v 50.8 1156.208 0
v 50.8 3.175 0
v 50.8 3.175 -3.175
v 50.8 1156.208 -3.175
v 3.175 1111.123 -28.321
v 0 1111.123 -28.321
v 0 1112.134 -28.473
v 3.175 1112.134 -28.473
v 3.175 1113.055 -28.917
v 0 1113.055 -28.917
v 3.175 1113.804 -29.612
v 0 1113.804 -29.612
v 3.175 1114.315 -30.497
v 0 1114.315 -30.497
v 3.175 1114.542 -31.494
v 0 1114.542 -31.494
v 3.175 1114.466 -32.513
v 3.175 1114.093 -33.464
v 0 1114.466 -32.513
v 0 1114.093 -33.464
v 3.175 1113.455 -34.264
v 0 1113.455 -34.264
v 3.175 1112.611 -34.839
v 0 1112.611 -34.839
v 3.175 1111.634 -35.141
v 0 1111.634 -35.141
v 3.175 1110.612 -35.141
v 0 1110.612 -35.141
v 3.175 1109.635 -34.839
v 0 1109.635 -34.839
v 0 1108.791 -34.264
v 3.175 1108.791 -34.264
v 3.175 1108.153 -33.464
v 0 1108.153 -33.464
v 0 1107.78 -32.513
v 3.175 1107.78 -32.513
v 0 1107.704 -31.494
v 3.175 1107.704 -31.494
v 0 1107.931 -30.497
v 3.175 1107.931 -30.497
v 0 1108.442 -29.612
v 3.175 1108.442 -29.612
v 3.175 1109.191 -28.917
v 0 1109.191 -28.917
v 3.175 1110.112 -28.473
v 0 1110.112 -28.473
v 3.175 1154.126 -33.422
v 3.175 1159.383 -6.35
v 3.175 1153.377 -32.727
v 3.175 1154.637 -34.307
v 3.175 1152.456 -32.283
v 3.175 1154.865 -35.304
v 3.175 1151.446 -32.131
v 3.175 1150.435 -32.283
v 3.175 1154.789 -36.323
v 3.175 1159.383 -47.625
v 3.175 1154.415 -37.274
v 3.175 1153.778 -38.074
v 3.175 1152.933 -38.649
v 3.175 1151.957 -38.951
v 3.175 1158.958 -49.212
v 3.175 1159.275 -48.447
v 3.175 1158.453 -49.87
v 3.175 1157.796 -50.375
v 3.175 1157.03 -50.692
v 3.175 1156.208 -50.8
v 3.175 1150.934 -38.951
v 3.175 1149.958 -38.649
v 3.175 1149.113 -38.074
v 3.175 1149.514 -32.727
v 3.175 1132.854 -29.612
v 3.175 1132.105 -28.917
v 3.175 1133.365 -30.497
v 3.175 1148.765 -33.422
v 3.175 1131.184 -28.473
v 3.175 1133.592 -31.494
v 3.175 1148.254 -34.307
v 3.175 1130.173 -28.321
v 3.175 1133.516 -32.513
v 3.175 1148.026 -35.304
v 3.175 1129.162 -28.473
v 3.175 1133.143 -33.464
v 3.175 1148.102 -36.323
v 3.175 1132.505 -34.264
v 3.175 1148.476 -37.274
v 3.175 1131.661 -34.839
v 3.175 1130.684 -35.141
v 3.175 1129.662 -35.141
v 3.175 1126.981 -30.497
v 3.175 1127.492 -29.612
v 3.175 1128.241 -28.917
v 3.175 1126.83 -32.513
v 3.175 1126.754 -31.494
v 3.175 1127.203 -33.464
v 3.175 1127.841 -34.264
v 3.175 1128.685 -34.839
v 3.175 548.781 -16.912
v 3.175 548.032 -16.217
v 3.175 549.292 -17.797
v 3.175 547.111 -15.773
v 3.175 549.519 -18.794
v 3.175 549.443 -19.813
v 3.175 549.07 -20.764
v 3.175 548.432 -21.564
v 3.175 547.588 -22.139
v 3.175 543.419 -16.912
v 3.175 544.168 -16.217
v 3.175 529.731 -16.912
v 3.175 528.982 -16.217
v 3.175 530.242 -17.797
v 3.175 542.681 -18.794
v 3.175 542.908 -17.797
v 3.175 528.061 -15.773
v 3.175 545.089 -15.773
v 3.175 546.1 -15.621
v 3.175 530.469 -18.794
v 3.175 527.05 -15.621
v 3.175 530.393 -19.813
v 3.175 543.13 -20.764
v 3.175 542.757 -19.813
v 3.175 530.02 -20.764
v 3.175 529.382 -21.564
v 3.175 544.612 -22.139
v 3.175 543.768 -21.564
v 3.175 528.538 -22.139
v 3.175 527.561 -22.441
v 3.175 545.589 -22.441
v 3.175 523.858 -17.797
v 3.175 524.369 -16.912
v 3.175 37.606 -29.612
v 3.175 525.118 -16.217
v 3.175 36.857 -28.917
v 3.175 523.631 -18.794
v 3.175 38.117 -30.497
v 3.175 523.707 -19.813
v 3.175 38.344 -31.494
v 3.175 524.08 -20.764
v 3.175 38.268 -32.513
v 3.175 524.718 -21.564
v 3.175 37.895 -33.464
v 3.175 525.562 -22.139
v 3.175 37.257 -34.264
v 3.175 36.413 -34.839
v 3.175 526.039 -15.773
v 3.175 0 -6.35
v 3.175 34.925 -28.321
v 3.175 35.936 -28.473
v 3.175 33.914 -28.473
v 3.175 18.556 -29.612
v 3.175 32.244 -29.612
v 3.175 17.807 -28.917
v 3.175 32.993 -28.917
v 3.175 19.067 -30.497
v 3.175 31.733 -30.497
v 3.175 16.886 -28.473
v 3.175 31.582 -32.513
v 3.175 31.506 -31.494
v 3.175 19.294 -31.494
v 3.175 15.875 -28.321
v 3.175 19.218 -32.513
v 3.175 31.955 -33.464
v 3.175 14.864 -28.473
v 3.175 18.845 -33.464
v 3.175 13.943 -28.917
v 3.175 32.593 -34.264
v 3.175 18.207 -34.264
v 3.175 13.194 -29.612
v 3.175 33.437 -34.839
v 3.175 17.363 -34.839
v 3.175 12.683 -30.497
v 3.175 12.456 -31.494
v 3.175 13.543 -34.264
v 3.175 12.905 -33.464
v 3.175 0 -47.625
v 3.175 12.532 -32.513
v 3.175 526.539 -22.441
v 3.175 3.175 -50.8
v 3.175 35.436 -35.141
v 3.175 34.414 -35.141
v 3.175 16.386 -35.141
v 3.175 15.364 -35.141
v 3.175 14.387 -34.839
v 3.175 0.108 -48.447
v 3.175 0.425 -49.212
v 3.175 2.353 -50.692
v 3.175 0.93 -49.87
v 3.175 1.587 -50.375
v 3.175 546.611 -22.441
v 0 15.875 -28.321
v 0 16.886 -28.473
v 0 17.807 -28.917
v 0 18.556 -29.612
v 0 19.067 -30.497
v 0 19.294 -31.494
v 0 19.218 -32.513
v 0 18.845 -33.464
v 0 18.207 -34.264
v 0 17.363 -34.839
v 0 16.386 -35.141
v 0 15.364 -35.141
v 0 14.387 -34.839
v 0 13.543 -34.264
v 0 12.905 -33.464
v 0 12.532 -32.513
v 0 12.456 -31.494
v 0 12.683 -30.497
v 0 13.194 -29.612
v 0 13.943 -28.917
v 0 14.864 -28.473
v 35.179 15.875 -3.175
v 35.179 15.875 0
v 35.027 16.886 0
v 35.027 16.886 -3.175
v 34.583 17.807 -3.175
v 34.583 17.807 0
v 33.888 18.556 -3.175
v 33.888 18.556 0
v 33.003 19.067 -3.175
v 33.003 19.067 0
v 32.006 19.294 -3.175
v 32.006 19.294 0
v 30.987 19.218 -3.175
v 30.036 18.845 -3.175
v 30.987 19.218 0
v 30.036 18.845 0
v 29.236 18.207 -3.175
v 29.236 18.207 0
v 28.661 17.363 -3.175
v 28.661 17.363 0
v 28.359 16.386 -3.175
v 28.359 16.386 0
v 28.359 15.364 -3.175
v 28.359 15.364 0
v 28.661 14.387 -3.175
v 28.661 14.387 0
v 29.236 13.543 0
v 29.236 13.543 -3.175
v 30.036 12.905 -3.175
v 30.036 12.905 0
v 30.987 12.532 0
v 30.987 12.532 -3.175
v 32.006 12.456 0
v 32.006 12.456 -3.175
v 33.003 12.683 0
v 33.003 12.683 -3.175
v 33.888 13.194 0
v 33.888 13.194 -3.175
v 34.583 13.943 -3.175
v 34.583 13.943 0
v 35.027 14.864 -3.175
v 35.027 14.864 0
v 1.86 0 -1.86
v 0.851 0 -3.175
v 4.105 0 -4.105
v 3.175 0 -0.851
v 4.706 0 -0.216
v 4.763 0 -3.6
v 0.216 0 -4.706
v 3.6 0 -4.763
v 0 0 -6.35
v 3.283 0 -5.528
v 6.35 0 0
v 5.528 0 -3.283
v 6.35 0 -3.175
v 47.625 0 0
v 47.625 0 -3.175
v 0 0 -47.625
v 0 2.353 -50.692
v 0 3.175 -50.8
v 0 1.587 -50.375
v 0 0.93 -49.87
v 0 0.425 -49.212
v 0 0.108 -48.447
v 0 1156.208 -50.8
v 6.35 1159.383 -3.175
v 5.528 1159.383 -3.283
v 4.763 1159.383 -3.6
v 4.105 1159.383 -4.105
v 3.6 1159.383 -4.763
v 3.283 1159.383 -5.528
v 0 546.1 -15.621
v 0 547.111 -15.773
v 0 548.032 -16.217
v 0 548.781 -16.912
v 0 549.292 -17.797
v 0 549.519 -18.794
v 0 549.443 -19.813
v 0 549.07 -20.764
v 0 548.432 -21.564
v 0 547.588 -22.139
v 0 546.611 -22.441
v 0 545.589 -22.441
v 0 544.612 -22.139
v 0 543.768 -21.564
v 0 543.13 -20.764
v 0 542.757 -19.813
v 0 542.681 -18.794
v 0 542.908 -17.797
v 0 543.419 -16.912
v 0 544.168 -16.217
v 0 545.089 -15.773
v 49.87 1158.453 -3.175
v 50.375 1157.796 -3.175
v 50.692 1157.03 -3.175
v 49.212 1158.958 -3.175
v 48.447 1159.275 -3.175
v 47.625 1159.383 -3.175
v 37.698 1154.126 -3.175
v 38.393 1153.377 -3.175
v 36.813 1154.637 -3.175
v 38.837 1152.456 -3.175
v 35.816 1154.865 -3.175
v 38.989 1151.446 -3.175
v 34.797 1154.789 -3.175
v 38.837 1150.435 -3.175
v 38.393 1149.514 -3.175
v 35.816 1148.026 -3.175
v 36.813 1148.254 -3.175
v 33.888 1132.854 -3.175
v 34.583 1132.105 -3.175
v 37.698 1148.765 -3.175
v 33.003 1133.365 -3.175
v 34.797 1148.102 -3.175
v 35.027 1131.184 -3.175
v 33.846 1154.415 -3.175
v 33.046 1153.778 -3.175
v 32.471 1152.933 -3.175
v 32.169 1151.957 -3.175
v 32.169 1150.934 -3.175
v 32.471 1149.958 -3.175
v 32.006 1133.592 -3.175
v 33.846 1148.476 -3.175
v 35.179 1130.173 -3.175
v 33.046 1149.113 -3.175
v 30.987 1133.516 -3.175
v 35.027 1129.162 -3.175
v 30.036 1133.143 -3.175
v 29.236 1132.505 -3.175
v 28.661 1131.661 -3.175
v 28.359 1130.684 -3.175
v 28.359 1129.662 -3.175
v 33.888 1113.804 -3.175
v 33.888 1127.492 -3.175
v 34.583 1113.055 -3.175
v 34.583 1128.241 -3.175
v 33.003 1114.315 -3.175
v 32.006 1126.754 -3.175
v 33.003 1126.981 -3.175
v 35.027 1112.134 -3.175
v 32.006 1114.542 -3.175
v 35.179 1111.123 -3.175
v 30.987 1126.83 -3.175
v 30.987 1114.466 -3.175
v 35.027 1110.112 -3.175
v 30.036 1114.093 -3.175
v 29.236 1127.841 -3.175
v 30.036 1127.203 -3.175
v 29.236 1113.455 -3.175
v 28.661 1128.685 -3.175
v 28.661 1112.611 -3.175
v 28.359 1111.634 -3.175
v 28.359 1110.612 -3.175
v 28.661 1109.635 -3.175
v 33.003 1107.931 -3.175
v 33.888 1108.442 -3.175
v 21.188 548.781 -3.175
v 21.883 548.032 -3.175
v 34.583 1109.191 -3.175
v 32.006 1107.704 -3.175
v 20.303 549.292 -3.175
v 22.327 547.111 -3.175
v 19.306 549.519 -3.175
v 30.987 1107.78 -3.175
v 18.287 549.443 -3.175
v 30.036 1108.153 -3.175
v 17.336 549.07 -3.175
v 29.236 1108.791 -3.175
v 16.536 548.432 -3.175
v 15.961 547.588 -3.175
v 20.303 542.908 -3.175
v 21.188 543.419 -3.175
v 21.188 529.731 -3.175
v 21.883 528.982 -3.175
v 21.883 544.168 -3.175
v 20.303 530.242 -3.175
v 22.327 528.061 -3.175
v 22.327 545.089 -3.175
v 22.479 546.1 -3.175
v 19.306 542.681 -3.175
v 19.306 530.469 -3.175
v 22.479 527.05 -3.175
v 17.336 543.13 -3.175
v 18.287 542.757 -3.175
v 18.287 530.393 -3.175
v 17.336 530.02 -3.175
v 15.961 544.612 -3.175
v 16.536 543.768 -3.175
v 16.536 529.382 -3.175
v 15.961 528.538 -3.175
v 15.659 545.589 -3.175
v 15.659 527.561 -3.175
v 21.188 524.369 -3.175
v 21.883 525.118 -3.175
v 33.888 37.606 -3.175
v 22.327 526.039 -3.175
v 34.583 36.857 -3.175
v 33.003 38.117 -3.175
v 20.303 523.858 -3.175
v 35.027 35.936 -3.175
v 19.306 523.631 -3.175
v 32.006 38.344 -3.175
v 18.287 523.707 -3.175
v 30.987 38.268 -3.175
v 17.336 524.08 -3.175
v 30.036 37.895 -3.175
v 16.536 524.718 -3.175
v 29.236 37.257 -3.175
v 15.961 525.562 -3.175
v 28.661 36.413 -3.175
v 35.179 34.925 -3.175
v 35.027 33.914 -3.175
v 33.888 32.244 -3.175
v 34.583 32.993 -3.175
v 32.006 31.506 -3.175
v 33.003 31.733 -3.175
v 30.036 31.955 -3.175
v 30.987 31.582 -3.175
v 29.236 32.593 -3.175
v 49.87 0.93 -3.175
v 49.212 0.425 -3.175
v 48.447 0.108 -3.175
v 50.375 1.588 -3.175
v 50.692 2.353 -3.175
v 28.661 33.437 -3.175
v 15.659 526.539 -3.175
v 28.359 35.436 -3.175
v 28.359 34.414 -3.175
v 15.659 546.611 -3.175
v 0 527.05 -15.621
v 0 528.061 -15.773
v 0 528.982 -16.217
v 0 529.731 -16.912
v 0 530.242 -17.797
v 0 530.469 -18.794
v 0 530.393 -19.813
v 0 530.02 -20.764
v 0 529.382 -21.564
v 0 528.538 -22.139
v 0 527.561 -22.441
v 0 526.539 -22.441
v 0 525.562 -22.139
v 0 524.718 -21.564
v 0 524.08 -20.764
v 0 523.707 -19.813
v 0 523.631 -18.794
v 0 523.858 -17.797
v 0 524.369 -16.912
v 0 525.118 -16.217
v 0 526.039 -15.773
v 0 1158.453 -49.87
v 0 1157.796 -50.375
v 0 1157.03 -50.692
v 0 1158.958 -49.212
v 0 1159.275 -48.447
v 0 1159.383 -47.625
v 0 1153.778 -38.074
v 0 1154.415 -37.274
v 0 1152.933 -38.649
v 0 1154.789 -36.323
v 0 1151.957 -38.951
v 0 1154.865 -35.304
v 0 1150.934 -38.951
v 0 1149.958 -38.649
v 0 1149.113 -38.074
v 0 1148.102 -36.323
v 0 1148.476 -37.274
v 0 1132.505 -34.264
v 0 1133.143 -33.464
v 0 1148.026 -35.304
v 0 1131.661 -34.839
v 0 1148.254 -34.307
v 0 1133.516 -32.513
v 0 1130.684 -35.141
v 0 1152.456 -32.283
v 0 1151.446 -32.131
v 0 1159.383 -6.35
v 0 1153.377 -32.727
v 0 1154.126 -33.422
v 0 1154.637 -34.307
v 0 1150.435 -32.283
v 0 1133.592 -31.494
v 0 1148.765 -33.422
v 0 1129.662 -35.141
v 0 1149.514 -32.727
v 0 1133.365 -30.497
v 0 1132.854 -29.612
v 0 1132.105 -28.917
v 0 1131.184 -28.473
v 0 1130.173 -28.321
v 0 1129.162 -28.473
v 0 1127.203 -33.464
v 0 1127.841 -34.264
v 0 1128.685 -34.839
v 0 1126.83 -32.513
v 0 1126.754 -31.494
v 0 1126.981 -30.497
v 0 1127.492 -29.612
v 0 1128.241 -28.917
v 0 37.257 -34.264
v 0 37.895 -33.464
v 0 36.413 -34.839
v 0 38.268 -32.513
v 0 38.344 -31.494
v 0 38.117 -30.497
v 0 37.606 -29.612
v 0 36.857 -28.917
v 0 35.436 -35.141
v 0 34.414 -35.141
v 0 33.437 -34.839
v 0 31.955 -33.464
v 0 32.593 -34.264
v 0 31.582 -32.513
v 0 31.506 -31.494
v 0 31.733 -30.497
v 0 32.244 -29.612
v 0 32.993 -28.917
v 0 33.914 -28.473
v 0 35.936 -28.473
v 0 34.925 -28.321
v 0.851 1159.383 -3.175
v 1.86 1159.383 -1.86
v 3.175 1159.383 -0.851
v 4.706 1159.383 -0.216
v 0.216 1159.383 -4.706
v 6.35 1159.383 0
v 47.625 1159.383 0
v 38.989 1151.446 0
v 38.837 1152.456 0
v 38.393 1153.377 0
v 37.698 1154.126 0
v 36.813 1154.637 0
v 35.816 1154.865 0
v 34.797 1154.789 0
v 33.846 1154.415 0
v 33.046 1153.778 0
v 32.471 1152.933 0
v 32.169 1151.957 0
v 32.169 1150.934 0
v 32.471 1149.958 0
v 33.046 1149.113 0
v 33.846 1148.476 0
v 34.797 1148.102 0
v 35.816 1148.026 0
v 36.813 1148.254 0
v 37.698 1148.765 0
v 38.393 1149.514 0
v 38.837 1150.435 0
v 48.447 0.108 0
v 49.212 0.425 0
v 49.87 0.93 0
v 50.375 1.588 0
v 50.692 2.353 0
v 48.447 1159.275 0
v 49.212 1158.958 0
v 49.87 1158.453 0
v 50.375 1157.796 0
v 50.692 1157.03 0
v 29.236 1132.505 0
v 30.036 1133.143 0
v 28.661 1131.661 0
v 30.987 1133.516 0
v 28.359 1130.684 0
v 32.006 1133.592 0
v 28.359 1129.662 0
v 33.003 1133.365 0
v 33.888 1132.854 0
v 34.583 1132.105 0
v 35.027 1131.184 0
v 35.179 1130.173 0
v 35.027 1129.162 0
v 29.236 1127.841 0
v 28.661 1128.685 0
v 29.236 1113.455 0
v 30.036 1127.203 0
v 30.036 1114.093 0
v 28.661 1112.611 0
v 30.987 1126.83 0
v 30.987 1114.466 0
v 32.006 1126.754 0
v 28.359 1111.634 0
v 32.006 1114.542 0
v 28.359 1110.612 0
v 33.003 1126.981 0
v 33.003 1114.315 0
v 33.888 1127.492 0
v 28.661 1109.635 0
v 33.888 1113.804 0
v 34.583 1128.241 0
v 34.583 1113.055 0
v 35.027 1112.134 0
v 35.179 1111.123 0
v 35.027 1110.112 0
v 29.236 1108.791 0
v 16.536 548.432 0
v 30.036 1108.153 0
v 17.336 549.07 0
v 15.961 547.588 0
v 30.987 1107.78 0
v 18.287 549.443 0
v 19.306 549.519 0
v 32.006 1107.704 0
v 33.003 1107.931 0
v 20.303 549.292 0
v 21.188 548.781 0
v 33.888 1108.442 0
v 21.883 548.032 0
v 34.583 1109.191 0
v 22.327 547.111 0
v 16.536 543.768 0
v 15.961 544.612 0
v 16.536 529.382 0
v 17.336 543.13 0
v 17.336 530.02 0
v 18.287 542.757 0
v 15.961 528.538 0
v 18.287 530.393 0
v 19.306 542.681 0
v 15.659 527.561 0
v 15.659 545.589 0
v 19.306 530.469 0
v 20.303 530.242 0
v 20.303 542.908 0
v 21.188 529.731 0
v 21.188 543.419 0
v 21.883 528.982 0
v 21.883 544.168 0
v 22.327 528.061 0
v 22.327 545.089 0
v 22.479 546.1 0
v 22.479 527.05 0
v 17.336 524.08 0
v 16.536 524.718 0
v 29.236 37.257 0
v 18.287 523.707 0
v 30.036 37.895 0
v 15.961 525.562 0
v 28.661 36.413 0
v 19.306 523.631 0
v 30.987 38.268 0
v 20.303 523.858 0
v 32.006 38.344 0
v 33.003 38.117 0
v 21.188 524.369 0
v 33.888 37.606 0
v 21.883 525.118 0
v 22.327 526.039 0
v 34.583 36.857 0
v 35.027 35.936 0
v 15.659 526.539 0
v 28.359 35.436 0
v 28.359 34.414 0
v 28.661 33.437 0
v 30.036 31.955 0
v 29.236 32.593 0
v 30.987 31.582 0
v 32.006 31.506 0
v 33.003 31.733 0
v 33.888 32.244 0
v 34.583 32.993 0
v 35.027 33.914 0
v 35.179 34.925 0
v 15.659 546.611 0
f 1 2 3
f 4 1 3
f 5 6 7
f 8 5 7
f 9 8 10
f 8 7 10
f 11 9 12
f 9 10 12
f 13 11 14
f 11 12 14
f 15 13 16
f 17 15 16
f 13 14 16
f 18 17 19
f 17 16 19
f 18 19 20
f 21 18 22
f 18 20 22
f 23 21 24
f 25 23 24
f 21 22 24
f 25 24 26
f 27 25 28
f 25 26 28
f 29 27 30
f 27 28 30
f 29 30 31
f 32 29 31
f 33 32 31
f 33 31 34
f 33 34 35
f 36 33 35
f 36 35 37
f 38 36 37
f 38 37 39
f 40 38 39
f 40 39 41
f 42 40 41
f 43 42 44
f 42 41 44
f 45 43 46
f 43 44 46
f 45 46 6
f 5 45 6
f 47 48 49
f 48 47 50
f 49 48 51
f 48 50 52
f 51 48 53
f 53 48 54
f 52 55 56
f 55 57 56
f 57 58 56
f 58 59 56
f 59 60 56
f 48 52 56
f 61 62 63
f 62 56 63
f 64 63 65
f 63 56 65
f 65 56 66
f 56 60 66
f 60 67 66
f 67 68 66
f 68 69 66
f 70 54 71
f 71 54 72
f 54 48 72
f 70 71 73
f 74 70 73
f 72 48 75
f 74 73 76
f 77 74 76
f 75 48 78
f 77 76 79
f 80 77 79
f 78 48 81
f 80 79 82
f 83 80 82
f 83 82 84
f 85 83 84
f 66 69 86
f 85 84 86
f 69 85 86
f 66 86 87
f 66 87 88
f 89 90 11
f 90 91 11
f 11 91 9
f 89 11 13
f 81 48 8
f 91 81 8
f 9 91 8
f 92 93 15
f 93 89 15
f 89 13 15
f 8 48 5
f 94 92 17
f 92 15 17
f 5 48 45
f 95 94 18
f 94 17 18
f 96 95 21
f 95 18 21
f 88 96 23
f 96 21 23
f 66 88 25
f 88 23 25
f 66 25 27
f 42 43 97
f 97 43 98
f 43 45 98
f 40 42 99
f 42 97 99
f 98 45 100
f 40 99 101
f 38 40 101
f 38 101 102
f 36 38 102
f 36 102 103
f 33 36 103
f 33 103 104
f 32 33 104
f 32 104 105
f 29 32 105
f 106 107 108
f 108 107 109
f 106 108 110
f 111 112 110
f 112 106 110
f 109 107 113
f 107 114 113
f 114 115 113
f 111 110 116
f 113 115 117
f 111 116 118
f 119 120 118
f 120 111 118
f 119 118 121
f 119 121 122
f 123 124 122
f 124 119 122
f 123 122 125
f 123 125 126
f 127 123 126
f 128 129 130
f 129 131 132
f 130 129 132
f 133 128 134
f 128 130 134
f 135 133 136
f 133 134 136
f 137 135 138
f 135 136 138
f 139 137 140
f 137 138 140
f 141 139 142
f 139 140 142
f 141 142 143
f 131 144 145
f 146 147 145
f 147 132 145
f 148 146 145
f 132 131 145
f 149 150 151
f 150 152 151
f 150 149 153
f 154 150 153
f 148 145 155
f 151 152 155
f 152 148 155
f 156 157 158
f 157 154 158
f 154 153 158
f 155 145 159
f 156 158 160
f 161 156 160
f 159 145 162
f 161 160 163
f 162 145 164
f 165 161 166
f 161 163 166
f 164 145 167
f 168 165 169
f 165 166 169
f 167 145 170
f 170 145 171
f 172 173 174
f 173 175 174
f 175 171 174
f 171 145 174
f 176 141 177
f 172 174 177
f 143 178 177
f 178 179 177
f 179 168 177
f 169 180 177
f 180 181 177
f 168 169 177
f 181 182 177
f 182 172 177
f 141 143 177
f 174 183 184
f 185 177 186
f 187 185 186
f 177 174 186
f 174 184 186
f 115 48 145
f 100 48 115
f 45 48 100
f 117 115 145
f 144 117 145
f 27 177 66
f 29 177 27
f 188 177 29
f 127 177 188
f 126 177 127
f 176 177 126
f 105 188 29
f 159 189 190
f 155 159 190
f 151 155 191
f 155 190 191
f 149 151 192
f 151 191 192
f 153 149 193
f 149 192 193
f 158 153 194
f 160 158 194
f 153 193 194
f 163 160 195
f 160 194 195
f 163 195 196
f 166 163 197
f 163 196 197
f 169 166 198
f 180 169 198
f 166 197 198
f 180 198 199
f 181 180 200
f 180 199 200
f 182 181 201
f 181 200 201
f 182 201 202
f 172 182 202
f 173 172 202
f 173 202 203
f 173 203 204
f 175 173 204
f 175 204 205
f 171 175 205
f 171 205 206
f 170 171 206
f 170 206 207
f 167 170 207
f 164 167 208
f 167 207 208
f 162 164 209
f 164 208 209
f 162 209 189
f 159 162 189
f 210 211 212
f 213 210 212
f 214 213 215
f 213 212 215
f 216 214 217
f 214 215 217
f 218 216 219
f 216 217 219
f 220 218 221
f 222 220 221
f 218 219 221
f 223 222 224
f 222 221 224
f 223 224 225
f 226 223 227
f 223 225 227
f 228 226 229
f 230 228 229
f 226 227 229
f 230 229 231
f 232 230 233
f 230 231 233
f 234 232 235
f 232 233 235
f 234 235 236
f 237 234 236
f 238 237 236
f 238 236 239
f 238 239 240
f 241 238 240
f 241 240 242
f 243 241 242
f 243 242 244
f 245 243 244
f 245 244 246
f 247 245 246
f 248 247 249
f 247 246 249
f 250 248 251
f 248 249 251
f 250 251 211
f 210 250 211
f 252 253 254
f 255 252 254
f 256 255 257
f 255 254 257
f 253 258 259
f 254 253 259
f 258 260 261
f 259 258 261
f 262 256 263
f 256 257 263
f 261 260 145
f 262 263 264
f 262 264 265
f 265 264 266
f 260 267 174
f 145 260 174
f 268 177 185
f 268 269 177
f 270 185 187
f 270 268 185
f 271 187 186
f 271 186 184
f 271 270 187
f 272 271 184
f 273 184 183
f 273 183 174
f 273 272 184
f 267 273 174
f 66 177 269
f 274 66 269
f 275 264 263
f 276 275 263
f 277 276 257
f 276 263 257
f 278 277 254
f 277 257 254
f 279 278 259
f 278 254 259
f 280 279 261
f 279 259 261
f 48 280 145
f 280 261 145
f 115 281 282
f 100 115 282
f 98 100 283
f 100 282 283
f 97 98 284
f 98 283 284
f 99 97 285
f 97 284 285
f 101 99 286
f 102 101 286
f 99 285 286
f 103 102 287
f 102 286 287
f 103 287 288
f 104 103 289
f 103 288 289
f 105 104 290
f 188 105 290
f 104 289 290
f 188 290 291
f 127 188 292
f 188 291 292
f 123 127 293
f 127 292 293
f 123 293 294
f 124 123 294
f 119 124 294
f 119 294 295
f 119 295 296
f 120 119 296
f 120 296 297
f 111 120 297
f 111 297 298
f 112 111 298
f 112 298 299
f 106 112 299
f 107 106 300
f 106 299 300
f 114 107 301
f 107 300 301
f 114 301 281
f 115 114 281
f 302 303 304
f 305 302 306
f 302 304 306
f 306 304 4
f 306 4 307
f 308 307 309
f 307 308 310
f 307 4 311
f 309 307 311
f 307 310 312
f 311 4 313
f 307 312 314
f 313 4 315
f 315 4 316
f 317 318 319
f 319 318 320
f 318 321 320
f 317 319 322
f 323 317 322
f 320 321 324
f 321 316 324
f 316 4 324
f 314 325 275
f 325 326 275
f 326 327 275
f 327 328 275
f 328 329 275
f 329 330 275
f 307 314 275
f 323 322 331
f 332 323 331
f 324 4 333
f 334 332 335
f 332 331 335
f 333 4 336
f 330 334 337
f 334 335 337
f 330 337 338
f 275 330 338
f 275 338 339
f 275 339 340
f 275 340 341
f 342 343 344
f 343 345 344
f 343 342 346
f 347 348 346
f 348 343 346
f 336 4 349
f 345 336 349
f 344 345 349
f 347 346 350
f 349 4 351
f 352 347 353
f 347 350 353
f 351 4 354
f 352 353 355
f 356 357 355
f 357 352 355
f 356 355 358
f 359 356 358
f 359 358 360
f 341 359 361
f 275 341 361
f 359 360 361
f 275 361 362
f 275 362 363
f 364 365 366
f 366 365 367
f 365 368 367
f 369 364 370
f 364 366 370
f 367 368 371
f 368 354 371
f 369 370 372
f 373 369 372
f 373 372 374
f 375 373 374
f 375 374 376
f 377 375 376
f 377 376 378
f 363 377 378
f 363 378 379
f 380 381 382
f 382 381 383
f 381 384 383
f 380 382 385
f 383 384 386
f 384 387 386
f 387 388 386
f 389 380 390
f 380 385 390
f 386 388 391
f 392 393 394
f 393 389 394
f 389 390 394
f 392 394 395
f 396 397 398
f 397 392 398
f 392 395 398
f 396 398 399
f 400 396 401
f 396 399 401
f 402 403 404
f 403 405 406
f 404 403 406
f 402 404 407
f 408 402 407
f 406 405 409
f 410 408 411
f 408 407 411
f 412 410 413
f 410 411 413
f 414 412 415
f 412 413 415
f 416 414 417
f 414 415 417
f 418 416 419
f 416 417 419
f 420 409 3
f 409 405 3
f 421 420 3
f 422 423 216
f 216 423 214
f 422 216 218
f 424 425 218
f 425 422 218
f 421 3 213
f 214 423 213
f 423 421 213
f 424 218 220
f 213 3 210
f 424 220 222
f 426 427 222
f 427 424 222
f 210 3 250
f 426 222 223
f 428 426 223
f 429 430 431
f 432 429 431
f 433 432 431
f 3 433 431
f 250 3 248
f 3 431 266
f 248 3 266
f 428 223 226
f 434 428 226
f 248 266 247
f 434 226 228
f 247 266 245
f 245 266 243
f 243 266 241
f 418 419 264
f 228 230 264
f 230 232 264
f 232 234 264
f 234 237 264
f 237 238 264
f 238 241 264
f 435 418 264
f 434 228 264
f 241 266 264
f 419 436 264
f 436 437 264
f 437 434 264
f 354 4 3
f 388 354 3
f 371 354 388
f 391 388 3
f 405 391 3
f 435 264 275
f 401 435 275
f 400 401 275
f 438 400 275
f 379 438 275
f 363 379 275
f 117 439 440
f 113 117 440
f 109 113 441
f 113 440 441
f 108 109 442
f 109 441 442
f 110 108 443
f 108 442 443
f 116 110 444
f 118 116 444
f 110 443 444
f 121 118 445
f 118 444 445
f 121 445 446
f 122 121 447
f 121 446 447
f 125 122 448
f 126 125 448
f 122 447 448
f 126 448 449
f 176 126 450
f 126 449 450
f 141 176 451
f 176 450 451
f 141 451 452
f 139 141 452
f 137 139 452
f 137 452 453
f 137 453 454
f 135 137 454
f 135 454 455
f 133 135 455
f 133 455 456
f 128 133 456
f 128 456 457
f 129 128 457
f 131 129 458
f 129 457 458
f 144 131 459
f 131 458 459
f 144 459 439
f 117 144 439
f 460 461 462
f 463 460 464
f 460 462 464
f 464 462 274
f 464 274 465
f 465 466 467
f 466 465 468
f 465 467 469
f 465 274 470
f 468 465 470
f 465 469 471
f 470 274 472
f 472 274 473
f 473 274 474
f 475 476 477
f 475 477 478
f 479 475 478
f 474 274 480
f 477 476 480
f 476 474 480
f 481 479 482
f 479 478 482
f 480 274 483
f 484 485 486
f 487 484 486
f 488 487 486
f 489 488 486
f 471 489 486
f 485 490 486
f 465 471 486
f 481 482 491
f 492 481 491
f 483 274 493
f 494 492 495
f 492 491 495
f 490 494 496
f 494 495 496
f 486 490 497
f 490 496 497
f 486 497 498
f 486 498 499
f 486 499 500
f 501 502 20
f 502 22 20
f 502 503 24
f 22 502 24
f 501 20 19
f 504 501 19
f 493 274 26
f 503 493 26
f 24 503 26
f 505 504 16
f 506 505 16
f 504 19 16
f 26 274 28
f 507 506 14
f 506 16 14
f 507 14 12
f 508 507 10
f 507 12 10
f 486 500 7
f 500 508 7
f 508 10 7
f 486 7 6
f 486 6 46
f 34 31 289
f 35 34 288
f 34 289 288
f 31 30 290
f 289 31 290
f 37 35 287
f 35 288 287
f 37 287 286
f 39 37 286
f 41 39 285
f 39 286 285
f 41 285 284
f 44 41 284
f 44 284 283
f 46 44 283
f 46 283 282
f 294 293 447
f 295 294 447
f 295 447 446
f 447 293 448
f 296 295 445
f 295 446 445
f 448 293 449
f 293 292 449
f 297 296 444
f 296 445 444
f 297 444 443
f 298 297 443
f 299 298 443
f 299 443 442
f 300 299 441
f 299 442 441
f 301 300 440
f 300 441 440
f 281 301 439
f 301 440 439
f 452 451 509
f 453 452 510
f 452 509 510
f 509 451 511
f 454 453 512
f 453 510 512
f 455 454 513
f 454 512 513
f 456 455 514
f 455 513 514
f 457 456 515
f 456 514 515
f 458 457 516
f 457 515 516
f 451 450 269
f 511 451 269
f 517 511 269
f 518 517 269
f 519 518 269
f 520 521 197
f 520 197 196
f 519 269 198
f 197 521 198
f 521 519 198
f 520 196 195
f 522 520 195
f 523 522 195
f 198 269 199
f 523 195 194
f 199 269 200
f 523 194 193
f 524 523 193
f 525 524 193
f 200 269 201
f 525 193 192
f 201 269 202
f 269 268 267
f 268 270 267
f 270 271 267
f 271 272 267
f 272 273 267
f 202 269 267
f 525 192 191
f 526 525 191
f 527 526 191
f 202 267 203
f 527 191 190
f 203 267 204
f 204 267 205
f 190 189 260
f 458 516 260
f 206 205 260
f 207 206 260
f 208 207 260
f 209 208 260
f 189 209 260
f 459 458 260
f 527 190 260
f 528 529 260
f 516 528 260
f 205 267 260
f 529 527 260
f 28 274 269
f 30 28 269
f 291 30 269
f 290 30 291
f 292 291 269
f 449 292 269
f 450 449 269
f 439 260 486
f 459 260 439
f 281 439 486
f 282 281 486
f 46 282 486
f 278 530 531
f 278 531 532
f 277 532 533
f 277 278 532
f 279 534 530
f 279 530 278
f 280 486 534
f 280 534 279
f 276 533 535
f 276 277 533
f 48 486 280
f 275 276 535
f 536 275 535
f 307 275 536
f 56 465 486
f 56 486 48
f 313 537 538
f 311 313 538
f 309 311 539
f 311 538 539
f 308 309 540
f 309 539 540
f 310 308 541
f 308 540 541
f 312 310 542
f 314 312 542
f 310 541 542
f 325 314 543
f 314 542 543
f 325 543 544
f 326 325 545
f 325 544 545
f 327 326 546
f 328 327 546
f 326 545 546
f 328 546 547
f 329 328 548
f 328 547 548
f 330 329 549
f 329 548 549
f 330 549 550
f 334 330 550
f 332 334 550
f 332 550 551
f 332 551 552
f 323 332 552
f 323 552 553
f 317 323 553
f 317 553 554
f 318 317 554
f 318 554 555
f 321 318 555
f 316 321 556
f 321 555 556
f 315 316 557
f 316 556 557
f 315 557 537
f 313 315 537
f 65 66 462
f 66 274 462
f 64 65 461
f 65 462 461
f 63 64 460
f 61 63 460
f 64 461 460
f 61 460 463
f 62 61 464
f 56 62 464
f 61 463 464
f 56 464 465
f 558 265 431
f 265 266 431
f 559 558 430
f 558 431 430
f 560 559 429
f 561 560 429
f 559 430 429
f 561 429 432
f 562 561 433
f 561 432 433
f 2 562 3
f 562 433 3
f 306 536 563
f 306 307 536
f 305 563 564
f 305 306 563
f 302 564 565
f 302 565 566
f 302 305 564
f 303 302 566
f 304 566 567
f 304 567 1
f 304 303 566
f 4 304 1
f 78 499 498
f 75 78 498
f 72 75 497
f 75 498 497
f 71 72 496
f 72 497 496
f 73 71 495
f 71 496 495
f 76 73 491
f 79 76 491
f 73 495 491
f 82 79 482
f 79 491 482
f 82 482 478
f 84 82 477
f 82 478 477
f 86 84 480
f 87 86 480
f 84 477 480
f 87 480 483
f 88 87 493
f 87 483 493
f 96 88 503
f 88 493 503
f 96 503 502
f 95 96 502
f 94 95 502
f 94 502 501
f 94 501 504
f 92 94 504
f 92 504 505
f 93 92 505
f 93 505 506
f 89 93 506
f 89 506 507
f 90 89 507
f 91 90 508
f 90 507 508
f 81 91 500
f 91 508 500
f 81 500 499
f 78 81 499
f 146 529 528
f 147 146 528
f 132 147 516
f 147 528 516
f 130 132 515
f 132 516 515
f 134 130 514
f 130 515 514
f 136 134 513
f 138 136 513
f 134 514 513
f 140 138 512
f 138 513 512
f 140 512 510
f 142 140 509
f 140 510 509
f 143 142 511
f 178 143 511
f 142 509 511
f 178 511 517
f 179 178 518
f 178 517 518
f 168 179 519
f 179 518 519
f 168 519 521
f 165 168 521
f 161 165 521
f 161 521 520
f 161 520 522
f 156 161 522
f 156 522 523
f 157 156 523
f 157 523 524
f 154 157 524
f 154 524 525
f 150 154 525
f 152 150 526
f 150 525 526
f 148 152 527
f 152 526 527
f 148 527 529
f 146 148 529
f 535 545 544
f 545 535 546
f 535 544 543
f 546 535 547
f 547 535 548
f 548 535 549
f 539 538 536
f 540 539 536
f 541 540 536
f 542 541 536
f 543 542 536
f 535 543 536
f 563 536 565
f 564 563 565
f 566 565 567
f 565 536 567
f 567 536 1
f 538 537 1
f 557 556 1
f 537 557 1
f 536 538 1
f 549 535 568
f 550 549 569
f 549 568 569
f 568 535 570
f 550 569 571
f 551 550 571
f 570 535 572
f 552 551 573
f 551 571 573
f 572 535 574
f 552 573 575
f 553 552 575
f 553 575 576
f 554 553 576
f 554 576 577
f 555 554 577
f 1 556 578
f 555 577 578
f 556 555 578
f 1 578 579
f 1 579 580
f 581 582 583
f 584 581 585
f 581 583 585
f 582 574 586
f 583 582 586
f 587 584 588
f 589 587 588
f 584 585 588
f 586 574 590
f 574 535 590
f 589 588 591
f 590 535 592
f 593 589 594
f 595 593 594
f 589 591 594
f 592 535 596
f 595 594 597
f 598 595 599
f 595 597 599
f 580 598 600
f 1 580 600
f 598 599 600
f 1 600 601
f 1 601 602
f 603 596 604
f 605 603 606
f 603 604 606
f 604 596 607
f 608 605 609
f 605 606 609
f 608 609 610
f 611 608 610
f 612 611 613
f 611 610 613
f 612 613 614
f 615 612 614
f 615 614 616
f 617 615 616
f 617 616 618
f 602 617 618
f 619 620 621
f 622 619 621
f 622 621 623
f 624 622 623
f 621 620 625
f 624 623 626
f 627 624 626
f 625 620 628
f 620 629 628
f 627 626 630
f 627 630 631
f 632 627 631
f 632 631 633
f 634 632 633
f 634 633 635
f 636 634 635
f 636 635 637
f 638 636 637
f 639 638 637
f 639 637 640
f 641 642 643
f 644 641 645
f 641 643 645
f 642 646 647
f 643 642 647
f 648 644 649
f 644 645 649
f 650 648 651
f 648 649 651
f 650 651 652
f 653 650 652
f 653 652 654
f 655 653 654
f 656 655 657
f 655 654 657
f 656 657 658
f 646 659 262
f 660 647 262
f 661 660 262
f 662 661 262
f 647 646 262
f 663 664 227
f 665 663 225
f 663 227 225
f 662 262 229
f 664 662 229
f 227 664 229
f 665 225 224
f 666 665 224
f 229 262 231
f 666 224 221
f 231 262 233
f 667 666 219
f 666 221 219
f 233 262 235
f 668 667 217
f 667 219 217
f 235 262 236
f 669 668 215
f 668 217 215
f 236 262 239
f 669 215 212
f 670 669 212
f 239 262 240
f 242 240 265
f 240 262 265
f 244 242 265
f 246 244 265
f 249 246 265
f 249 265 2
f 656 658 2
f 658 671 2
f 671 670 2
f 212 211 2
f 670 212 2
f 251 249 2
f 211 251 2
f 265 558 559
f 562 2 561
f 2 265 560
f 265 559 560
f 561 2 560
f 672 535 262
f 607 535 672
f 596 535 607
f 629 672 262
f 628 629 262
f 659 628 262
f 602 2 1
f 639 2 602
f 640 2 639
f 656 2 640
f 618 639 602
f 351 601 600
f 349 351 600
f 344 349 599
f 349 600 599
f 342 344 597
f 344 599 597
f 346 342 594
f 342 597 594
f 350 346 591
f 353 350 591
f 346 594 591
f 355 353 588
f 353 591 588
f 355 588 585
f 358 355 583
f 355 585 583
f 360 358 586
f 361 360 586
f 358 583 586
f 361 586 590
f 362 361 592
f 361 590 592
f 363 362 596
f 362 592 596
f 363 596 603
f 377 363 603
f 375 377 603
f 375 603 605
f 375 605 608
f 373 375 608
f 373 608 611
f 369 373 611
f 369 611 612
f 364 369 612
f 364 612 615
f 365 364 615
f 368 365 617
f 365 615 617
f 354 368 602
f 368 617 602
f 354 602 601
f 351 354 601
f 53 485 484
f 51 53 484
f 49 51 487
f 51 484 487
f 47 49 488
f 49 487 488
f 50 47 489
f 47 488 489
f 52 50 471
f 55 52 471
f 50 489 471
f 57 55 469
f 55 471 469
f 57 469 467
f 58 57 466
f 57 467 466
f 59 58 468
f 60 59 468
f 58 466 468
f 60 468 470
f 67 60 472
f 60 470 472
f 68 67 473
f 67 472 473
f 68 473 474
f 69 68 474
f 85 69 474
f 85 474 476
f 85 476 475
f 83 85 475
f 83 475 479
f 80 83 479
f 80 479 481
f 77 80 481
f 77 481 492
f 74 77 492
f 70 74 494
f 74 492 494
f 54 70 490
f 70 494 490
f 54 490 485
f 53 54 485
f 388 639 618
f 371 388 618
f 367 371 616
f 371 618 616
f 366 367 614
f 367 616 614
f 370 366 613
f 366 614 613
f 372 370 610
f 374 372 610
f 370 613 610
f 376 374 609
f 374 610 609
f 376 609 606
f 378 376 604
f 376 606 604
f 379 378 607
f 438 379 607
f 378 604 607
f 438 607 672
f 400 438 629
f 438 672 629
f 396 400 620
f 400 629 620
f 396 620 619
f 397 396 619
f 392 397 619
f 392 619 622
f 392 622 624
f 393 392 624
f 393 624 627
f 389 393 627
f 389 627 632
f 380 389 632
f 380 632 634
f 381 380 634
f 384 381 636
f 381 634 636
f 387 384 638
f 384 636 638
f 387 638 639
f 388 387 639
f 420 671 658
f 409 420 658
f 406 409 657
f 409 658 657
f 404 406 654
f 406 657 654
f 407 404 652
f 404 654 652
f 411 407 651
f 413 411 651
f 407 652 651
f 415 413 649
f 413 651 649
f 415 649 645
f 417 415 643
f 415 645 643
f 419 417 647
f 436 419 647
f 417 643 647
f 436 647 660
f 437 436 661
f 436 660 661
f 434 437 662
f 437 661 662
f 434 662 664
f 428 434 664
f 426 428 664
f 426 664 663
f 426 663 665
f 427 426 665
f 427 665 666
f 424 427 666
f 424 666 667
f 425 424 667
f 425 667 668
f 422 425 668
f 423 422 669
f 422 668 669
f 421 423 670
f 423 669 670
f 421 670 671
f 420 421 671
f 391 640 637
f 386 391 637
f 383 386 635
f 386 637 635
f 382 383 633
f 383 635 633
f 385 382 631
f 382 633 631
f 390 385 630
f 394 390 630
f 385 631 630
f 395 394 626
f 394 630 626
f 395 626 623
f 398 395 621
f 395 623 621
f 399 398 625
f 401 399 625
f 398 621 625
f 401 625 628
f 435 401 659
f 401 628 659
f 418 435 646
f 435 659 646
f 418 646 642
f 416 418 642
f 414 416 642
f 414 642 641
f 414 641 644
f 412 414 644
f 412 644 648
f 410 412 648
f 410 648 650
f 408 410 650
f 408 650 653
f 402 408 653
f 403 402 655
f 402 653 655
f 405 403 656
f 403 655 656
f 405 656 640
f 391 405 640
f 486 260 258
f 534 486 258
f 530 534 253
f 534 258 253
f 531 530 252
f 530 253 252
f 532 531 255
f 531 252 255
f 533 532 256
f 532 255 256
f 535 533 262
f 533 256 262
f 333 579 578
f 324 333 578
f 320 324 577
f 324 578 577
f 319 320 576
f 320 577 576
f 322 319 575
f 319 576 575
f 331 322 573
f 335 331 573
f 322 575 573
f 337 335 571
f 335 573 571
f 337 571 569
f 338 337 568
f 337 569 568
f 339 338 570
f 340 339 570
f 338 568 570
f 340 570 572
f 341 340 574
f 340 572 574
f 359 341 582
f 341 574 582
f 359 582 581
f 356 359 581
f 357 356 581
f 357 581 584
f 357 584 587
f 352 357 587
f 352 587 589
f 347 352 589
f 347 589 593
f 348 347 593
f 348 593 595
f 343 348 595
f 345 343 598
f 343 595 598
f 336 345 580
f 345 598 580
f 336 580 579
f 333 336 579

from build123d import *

# Parameters (mm, degrees)
BASE_FLANGE1_DEPTH = 1159.383
SKETCH2_R          = 3.429
CUT_EXTRUDE1_DEPTH = 3.175
SKETCH3_R          = 3.429
CUT_EXTRUDE2_DEPTH = 3.175
FILLET1_R          = 3.175


# Sheet-metal steps are written as plain solids
with BuildPart() as part:
    # Sketch1 → Base-Flange1 (new body)
    with BuildSketch(Plane(origin=(0, 0, 0), x_dir=(1, 0, 0), z_dir=(0, 1, 0))):
        with BuildLine():
            Line((0, 50.8), (0, 6.35))
            ThreePointArc((0, 6.35), (1.859871939, 1.859871939), (6.35, 0))
            Line((6.35, 0), (50.8, 0))
            Line((50.8, 0), (50.8, 3.175))
            Line((50.8, 3.175), (6.35, 3.175))
            ThreePointArc((6.35, 3.175), (4.10493597, 4.10493597), (3.175, 6.35))
            Line((3.175, 6.35), (3.175, 50.8))
            Line((3.175, 50.8), (0, 50.8))
        make_face()
    extrude(amount=BASE_FLANGE1_DEPTH)

    # Sketch2 → Cut-Extrude1 (cut)
    with BuildSketch(Plane.XY):
        with Locations((31.75, 34.925)):
            Circle(SKETCH2_R)
        with Locations((31.75, 15.875)):
            Circle(SKETCH2_R)
        with Locations((19.05, 546.1)):
            Circle(SKETCH2_R)
        with Locations((19.05, 527.05)):
            Circle(SKETCH2_R)
        with Locations((31.75, 1130.173)):
            Circle(SKETCH2_R)
        with Locations((31.75, 1111.123)):
            Circle(SKETCH2_R)
        with Locations((35.56, 1151.4455)):
            Circle(SKETCH2_R)
    extrude(amount=-CUT_EXTRUDE1_DEPTH, mode=Mode.SUBTRACT)

    # Sketch3 → Cut-Extrude2 (cut)
    with BuildSketch(Plane.ZY):
        with Locations((-35.56, 1151.4455)):
            Circle(SKETCH3_R)
        with Locations((-31.75, 34.925)):
            Circle(SKETCH3_R)
        with Locations((-31.75, 15.875)):
            Circle(SKETCH3_R)
        with Locations((-19.05, 546.1)):
            Circle(SKETCH3_R)
        with Locations((-19.05, 527.05)):
            Circle(SKETCH3_R)
        with Locations((-31.75, 1130.173)):
            Circle(SKETCH3_R)
        with Locations((-31.75, 1111.123)):
            Circle(SKETCH3_R)
    extrude(amount=-CUT_EXTRUDE2_DEPTH, mode=Mode.SUBTRACT)

    # Fillet1
    fillet1_edges = [part.edges().sort_by_distance(p)[0] for p in [
        (1.5875, 1159.383, -50.8),
        (1.5875, 0, -50.8),
        (50.8, 1159.383, -1.5875),
        (50.8, 0, -1.5875),
    ]]
    fillet(fillet1_edges, radius=FILLET1_R)


solid = part.part
